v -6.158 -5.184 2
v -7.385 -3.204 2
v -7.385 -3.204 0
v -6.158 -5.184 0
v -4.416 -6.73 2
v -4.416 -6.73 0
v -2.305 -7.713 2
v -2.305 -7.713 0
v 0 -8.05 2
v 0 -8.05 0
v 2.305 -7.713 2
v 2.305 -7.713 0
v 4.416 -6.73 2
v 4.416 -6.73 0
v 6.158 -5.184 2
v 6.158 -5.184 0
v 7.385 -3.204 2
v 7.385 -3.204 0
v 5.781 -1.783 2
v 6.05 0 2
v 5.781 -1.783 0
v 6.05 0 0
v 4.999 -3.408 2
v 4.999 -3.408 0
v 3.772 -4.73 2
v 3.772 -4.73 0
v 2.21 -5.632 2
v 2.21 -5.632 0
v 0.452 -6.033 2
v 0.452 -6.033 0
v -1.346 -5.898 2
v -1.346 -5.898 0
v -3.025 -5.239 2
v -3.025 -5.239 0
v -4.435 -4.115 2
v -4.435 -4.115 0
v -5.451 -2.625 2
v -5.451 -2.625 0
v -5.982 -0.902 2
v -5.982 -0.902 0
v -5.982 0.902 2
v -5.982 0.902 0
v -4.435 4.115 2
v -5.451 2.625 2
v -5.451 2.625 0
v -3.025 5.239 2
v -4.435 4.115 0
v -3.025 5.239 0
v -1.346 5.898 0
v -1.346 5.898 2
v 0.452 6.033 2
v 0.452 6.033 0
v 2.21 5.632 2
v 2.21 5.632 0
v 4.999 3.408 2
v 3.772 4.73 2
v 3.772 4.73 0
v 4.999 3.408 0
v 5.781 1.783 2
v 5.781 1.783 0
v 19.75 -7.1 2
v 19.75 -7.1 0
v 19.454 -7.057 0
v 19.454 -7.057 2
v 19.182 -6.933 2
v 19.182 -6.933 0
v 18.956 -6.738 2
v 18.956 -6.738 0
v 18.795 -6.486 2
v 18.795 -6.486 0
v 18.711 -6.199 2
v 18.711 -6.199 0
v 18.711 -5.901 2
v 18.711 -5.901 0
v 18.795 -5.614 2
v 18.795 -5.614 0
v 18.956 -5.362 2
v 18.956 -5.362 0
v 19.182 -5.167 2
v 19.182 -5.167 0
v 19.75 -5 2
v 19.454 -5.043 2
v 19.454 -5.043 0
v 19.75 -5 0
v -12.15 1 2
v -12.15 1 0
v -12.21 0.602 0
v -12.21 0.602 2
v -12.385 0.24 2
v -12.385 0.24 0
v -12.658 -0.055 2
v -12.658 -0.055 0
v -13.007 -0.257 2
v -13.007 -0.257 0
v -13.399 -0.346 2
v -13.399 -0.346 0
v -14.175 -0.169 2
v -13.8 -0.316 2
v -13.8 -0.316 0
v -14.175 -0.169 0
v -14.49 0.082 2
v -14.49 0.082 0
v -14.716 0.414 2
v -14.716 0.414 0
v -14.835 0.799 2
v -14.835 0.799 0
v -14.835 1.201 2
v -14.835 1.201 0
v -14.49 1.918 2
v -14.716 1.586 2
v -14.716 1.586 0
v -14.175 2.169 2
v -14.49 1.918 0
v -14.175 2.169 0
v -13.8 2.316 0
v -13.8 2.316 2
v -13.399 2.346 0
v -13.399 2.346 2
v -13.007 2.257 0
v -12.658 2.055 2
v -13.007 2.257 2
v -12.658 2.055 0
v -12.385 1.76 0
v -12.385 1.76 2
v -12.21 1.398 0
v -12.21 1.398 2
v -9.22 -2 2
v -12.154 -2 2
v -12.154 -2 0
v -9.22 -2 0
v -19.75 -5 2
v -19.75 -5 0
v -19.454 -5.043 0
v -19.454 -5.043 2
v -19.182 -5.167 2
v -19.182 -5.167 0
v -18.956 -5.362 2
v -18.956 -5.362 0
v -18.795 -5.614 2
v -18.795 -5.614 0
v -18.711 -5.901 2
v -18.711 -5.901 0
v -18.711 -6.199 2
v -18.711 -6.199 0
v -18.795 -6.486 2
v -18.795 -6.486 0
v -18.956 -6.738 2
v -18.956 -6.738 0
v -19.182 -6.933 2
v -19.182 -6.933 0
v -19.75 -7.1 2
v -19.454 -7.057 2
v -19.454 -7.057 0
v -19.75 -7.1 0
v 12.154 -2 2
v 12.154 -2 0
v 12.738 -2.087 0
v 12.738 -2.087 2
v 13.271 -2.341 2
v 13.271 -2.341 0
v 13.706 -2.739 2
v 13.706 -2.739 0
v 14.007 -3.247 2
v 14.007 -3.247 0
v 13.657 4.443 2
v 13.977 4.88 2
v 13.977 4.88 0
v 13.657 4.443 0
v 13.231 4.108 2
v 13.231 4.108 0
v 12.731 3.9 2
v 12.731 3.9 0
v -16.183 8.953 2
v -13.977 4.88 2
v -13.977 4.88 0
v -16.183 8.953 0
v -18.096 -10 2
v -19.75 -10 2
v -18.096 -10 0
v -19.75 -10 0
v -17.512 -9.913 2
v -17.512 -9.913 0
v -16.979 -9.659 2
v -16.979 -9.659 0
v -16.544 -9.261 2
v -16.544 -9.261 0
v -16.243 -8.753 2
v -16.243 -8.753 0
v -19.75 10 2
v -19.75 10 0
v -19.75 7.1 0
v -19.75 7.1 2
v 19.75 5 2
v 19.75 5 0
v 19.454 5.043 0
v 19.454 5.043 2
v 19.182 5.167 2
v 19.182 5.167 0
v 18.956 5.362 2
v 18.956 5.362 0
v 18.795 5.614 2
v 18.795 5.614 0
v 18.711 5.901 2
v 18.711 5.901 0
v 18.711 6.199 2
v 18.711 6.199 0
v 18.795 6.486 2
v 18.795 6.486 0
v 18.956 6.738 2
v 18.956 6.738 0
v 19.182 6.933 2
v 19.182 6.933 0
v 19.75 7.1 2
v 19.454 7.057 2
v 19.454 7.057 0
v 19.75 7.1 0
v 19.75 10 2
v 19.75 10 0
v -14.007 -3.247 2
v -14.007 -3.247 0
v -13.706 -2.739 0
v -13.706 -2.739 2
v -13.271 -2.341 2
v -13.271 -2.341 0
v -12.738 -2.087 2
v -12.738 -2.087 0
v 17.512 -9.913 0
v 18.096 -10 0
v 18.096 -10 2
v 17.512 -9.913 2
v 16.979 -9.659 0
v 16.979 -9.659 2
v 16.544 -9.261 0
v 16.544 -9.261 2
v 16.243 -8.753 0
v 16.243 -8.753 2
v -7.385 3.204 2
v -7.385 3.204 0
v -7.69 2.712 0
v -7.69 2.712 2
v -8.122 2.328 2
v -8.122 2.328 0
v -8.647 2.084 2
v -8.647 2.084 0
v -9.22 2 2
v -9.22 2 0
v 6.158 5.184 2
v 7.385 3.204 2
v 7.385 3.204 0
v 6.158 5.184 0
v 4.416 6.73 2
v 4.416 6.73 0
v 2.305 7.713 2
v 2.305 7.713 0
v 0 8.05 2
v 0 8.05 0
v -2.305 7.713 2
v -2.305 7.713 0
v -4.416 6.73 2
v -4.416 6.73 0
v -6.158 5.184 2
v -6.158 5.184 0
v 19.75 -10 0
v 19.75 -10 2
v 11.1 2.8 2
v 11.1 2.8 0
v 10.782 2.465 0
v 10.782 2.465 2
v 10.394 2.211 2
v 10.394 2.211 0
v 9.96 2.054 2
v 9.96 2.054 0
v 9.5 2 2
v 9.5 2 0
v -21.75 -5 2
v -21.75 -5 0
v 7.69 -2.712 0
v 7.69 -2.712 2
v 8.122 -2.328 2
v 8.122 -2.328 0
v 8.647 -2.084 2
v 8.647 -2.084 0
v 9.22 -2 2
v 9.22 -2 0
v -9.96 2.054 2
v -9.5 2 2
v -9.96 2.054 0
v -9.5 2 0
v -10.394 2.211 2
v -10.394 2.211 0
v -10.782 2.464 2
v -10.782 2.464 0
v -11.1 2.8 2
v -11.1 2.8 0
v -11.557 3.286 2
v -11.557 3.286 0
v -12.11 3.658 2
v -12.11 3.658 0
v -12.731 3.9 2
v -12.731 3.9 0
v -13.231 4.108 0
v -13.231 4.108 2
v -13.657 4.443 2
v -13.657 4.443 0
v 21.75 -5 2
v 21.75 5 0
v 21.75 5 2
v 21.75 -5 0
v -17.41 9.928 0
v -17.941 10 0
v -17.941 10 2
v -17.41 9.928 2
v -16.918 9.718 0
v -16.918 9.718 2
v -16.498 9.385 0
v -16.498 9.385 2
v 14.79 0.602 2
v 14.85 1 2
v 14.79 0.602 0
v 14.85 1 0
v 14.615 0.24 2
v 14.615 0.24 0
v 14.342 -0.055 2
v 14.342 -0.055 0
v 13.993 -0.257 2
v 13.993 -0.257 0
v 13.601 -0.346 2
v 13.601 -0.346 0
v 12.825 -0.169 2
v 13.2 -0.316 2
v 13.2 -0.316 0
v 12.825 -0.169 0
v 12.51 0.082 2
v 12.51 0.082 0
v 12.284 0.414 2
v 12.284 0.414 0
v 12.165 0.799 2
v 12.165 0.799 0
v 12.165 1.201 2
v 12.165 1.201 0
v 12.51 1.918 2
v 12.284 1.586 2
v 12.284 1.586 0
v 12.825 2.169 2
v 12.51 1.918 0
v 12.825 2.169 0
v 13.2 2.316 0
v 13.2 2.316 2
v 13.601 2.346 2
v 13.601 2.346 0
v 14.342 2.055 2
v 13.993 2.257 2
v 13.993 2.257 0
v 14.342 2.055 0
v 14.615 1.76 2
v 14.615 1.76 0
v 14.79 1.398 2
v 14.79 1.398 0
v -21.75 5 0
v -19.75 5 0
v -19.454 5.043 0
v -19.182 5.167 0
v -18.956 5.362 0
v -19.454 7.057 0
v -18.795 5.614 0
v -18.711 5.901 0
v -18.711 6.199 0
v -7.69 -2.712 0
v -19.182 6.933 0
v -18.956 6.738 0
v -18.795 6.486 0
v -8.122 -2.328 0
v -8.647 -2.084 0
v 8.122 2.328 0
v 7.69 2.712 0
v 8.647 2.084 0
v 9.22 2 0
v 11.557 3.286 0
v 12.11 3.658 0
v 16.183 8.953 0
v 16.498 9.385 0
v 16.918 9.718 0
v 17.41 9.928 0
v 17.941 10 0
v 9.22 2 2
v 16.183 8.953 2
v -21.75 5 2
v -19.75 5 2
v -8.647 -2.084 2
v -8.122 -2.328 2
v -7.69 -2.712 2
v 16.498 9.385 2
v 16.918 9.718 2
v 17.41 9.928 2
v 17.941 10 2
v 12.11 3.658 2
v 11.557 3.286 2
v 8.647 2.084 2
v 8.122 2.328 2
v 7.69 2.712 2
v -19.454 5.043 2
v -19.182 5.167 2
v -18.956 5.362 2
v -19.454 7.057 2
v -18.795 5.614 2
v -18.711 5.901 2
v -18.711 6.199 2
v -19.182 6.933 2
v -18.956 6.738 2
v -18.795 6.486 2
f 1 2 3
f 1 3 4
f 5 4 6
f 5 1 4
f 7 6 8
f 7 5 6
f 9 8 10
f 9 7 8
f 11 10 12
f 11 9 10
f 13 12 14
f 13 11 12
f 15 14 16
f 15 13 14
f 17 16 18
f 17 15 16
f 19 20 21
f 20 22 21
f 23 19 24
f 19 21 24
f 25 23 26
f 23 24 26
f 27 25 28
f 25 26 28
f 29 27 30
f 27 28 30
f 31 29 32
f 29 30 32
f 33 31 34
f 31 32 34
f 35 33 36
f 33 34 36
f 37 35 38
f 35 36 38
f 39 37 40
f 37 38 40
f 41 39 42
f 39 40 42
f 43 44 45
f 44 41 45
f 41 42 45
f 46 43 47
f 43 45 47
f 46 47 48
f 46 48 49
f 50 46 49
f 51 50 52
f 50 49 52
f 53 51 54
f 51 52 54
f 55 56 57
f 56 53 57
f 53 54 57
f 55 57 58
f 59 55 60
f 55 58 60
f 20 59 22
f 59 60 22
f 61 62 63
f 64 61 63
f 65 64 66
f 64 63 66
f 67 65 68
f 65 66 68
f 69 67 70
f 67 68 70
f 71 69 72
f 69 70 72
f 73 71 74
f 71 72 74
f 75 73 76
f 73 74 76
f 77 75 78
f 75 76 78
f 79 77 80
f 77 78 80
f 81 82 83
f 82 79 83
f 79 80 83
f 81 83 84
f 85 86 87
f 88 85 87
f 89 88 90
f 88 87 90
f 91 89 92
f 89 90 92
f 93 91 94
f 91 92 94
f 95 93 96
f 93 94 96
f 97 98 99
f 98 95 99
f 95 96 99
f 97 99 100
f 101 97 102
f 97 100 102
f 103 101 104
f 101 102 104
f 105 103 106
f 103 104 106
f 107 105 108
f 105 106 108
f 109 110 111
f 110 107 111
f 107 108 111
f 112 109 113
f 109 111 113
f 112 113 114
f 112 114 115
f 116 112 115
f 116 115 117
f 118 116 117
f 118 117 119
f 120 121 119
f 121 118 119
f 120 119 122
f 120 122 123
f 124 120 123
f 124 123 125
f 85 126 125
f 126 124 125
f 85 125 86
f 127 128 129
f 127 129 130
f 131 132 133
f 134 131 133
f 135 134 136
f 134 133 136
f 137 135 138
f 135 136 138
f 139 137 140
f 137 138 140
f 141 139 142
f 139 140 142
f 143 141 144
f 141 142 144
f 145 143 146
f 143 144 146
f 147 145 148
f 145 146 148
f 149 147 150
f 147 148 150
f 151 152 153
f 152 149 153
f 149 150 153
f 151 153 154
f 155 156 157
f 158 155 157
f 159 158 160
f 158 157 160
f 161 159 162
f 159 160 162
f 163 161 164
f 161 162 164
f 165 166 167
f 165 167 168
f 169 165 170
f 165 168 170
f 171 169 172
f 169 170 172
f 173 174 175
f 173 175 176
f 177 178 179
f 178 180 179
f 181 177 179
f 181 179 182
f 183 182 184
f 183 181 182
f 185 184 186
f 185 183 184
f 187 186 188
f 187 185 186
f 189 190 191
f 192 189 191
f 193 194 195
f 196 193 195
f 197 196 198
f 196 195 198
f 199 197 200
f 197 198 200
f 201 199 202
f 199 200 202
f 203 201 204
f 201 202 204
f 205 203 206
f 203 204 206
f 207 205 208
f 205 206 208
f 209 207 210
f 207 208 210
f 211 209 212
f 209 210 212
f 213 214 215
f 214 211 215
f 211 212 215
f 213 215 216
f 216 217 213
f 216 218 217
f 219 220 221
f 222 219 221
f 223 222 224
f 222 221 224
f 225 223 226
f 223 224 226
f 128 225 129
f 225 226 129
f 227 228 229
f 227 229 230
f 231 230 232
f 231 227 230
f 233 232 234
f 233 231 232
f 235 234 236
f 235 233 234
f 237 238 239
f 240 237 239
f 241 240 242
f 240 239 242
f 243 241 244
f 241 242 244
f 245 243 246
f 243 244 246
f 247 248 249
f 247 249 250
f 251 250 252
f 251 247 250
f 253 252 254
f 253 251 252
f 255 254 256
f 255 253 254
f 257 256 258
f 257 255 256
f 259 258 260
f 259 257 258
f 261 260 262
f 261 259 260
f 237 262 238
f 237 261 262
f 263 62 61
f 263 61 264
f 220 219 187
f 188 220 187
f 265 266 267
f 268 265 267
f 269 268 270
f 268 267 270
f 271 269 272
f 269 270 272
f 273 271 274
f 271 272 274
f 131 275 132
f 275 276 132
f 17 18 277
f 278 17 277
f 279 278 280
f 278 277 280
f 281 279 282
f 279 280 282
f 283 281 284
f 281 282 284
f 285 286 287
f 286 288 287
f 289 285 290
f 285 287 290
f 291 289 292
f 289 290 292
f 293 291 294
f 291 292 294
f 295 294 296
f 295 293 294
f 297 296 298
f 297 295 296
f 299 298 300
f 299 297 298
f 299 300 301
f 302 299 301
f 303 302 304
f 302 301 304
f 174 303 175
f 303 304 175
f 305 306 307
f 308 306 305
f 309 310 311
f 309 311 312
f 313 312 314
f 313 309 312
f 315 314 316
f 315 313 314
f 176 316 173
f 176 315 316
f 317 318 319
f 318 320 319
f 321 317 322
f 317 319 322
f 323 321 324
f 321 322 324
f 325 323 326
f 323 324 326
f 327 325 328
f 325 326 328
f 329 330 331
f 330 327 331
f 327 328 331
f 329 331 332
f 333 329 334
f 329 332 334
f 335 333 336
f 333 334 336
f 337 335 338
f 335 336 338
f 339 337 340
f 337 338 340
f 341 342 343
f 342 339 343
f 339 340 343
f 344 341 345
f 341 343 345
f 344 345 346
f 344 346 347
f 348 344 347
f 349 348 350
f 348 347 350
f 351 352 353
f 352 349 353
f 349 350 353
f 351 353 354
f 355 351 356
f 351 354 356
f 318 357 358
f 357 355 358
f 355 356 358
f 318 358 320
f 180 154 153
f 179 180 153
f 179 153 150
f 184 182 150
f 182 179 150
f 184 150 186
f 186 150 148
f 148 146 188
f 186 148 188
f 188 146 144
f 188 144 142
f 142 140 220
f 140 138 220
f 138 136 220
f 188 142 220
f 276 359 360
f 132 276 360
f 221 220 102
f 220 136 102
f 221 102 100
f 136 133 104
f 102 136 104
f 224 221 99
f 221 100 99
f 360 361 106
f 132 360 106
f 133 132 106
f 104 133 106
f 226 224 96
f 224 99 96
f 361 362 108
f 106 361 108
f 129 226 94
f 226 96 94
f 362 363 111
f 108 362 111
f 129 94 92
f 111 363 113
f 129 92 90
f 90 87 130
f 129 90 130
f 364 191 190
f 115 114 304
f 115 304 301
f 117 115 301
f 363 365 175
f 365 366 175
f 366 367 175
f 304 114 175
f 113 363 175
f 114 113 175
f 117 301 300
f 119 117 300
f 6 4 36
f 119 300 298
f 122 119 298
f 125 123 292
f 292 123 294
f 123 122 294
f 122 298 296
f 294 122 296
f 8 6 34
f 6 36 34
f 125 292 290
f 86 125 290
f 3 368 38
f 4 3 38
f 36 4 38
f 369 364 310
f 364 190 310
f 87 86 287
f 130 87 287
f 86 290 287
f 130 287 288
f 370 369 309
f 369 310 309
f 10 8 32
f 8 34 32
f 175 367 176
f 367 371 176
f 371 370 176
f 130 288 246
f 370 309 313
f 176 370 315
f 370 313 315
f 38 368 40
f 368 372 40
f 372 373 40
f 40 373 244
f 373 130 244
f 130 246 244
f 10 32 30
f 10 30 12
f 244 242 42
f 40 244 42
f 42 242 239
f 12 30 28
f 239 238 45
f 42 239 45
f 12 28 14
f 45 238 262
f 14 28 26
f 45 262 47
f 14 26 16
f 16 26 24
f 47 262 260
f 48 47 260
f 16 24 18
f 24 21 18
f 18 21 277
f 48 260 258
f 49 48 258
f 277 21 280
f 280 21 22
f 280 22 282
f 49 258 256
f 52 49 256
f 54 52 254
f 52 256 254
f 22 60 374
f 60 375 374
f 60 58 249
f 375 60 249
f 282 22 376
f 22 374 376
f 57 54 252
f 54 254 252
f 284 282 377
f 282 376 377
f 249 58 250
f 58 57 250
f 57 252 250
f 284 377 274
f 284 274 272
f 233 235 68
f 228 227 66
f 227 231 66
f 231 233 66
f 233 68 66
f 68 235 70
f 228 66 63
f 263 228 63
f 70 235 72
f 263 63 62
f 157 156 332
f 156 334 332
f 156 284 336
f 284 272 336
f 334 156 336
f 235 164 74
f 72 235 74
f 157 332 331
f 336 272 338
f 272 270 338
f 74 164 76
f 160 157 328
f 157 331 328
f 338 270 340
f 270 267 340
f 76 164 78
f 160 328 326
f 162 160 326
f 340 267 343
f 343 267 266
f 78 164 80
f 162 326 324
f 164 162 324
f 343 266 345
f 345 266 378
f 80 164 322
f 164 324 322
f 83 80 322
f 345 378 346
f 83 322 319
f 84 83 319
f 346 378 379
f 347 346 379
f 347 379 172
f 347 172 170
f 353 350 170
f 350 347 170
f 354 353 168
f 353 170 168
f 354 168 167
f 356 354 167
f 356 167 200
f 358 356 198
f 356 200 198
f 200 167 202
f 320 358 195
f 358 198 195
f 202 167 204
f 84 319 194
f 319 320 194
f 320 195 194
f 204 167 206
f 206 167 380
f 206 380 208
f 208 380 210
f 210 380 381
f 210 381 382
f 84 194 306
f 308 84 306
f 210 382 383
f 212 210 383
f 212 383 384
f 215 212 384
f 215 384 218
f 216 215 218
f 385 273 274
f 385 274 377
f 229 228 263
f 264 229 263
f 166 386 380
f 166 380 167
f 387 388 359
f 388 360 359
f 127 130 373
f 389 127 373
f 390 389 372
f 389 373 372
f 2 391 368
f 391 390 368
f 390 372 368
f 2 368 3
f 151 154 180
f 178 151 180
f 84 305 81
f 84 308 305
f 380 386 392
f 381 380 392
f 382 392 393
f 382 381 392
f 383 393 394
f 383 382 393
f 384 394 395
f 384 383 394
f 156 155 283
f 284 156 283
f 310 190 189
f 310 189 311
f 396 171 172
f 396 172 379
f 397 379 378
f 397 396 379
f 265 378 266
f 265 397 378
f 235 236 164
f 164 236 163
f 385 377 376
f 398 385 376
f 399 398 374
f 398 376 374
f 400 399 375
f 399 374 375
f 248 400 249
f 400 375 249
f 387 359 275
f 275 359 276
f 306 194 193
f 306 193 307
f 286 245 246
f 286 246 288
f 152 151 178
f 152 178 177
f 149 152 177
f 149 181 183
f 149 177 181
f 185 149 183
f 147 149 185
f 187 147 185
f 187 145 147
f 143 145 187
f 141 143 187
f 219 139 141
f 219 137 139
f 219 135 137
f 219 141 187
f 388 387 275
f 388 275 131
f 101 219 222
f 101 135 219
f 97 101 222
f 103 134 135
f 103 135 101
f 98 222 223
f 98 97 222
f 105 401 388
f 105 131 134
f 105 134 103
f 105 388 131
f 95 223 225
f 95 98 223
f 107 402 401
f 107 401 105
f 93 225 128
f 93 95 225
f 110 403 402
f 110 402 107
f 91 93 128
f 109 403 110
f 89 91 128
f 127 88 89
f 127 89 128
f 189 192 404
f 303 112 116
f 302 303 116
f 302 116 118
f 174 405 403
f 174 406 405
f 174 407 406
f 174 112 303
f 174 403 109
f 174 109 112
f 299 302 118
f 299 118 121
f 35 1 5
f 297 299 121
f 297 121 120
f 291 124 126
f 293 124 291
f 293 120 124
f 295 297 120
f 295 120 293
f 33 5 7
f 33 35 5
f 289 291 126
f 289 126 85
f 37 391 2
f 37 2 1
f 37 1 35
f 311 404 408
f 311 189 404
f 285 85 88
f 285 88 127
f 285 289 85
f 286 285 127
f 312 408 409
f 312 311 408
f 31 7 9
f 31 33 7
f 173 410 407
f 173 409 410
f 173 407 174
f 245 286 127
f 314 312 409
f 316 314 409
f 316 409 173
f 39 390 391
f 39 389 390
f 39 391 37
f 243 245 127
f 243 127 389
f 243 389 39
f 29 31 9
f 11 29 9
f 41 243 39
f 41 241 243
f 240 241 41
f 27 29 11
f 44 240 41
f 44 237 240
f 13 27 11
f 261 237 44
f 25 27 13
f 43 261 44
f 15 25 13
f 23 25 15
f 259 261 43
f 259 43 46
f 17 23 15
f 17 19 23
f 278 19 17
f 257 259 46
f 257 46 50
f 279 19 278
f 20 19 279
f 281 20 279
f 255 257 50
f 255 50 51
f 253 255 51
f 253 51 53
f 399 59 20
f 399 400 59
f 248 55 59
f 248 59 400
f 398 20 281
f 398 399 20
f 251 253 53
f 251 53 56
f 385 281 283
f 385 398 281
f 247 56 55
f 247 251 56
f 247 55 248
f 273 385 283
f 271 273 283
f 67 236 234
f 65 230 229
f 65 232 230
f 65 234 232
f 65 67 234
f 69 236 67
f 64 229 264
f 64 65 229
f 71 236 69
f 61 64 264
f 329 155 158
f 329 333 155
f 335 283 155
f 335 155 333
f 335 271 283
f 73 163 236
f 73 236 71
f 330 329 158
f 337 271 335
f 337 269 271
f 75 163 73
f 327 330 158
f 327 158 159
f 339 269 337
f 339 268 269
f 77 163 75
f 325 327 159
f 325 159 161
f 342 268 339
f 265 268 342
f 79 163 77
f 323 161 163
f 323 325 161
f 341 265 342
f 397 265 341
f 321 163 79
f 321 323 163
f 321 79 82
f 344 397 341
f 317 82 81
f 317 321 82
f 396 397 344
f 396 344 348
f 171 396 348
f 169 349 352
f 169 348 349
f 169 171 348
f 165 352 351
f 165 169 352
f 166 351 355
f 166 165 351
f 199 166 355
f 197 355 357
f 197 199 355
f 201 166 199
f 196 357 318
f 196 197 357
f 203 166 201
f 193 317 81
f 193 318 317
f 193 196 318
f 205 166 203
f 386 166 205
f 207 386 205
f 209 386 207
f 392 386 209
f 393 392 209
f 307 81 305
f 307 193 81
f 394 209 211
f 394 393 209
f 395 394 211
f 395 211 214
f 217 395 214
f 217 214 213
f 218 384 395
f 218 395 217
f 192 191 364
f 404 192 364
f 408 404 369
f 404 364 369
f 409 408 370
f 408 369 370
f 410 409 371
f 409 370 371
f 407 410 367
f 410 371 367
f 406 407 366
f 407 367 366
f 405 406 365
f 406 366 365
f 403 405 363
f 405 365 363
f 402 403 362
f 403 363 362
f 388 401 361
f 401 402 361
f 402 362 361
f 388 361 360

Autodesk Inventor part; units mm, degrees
ref_plane "YZ Plane" through (0, 0, 0) normal (1, 0, 0) x (0, 1, 0)
ref_plane "XZ Plane" through (0, 0, 0) normal (0, 1, 0) x (-1, 0, 0)
ref_plane "XY Plane" through (0, 0, 0) normal (0, 0, 1) x (1, 0, 0)
sketch "スケッチ1" plane through (0, 0, 0) normal (0, 0, 1) x (1, 0, 0)
  circle A0 centre (0, 0) radius 10.5 construction
  circle A1 centre (-13.5, 1) radius 1.35
  line L0 (-13.5, 28) -> (13.5, 28) construction
  line L1 (13.5, 28) -> (13.5, 1) construction
  line L2 (13.5, 1) -> (-13.5, 1) construction
  line L3 (-13.5, 1) -> (-13.5, 28) construction
  circle A2 centre (-13.5, 28) radius 1.35
  circle A3 centre (13.5, 1) radius 1.35
  circle A4 centre (13.5, 28) radius 1.35
  line L4 (-19.75, 10) -> (-19.75, 7.1)
  line L5 (-19.75, 10) -> (19.75, 10)
  line L6 (19.75, 10) -> (19.75, 7.1)
  line L7 (-19.75, -7.1) -> (-19.75, -10)
  line L8 (-19.75, -10) -> (19.75, -10)
  line L9 (19.75, -7.1) -> (19.75, -10)
  line L10 (-19.75, 5) -> (-21.75, 5)
  line L11 (-21.75, 5) -> (-21.75, -5)
  line L12 (-21.75, -5) -> (-19.75, -5)
  arc A5 (-19.75, 5) -> (-19.75, 7.1) centre (-19.75, 6.05) ccw
  arc A6 (-19.75, -7.1) -> (-19.75, -5) centre (-19.75, -6.05) ccw
  line L13 (19.75, 5) -> (21.75, 5)
  line L14 (21.75, 5) -> (21.75, -5)
  line L15 (21.75, -5) -> (19.75, -5)
  arc A7 (19.75, 7.1) -> (19.75, 5) centre (19.75, 6.05) ccw
  line L16 (0, 28) -> (0, 0) construction
  arc A8 (19.75, -5) -> (19.75, -7.1) centre (19.75, -6.05) ccw
  line L17 (-21.75, 0) -> (21.75, 0) construction
  circle A9 centre (0, 0) radius 6.05
  point P0 (0, 10)
  dimension "d8" = 21
  dimension "d10" = 27
  dimension "d12" = 1
  dimension "d13" = 2.7
  dimension "d38" = 27
  dimension "d44" = 27
  dimension "d47" = 1.05
  dimension "d48" = 39.5
  dimension "d49" = 2
  dimension "d50" = 10
  dimension "d51" = 5
  dimension "d52" = 12.1
extrude "押し出し1" add sketch "スケッチ1" along normal blind 2 contours L5 L6 A7 L13 L14 L15 A8 L9 L8 L7 A6 L12 L11 L10 A5 L4
sketch "スケッチ2" plane through (0, 0, 2) normal (0, 0, 1) x (1, 0, 0)
  circle A0 centre (0, 0) radius 6.05 projected
  circle A1 centre (13.5, 1) radius 1.35 projected
  circle A2 centre (-13.5, 1) radius 1.35 projected
  line L0 (-19.75, -10) -> (19.75, -10) projected
  line L1 (21.75, -5) -> (21.75, 5) projected
  line L2 (19.75, 10) -> (-19.75, 10) projected
  line L3 (21.75, 0) -> (0, 0) construction
  line L4 (13.5, -2) -> (7.7976, -2)
  arc A3 (-7.7976, -2) -> (7.7976, -2) centre (0, 0) ccw
  line L5 (-13.5, -2) -> (-7.7976, -2)
  line L6 (0, 0) -> (0, -6.05) construction
  circle A4 centre (0, 0) radius 6.05 construction
  arc A5 (13.5, 4) -> (10.6716, 2) centre (13.5, 1) ccw
  line L7 (10.6716, 2) -> (7.7976, 2)
  arc A6 (7.7976, 2) -> (-7.7976, 2) centre (0, 0) ccw
  line L8 (-7.7976, 2) -> (-10.6716, 2)
  arc A7 (-10.6716, 2) -> (-13.5, 4) centre (-13.5, 1) ccw
  line L9 (-13.5, 4) -> (-18.2897, 12.8425)
  line L10 (-18.2897, 12.8425) -> (18.2897, 12.8425)
  line L11 (18.2897, 12.8425) -> (13.5, 4)
  line L12 (-13.5, -2) -> (-18.8131, -15.0783)
  line L13 (-18.8131, -15.0783) -> (18.8131, -15.0783)
  line L14 (18.8131, -15.0783) -> (13.5, -2)
  line L15 (-16.75, 10) -> (-19.75, 10) construction
  line L16 (16.75, 10) -> (19.75, 10) construction
  line L17 (-19.75, -10) -> (19.75, -10) construction
  line L18 (-19.75, -10) -> (-16.75, -10) construction
  line L19 (16.75, -10) -> (19.75, -10) construction
  dimension "d55" = 2
  dimension "d56" = 2
  dimension "d57" = 3
  dimension "d61" = 3
  dimension "d62" = 3
extrude "押し出し2" cut sketch "スケッチ2" against normal blind 10 contours L12 L5 A3 L4 L14 L0 | L0 L14 L13 L12 | L11 A5 L7 A6 L8 A7 L9 L2
fillet "フィレット1" radius 2 14 edges at (7.7976, 2, 1) (7.7976, -2, 1) (-7.7976, -2, 1) (-7.7976, 2, 1) (13.5, -2, 1) (-13.5, -2, 1) (-13.5, 4, 1) (-10.6716, 2, 1) (10.6716, 2, 1) (13.5, 4, 1) (-16.75, 10, 1) (-16.75, -10, 1) (16.75, -10, 1) (16.75, 10, 1)
equation "\"d38\" = d10"
equation "\"d44\" = d10"
equation "\"d50\" = d11"
equation "\"d51\" = d12_1"
equation "\"d11\" = 10"
equation "\"d12_1\" = 5"
properties part number "足首_サブフレーム_1_2" material "アルミニウム 2014-T4"
